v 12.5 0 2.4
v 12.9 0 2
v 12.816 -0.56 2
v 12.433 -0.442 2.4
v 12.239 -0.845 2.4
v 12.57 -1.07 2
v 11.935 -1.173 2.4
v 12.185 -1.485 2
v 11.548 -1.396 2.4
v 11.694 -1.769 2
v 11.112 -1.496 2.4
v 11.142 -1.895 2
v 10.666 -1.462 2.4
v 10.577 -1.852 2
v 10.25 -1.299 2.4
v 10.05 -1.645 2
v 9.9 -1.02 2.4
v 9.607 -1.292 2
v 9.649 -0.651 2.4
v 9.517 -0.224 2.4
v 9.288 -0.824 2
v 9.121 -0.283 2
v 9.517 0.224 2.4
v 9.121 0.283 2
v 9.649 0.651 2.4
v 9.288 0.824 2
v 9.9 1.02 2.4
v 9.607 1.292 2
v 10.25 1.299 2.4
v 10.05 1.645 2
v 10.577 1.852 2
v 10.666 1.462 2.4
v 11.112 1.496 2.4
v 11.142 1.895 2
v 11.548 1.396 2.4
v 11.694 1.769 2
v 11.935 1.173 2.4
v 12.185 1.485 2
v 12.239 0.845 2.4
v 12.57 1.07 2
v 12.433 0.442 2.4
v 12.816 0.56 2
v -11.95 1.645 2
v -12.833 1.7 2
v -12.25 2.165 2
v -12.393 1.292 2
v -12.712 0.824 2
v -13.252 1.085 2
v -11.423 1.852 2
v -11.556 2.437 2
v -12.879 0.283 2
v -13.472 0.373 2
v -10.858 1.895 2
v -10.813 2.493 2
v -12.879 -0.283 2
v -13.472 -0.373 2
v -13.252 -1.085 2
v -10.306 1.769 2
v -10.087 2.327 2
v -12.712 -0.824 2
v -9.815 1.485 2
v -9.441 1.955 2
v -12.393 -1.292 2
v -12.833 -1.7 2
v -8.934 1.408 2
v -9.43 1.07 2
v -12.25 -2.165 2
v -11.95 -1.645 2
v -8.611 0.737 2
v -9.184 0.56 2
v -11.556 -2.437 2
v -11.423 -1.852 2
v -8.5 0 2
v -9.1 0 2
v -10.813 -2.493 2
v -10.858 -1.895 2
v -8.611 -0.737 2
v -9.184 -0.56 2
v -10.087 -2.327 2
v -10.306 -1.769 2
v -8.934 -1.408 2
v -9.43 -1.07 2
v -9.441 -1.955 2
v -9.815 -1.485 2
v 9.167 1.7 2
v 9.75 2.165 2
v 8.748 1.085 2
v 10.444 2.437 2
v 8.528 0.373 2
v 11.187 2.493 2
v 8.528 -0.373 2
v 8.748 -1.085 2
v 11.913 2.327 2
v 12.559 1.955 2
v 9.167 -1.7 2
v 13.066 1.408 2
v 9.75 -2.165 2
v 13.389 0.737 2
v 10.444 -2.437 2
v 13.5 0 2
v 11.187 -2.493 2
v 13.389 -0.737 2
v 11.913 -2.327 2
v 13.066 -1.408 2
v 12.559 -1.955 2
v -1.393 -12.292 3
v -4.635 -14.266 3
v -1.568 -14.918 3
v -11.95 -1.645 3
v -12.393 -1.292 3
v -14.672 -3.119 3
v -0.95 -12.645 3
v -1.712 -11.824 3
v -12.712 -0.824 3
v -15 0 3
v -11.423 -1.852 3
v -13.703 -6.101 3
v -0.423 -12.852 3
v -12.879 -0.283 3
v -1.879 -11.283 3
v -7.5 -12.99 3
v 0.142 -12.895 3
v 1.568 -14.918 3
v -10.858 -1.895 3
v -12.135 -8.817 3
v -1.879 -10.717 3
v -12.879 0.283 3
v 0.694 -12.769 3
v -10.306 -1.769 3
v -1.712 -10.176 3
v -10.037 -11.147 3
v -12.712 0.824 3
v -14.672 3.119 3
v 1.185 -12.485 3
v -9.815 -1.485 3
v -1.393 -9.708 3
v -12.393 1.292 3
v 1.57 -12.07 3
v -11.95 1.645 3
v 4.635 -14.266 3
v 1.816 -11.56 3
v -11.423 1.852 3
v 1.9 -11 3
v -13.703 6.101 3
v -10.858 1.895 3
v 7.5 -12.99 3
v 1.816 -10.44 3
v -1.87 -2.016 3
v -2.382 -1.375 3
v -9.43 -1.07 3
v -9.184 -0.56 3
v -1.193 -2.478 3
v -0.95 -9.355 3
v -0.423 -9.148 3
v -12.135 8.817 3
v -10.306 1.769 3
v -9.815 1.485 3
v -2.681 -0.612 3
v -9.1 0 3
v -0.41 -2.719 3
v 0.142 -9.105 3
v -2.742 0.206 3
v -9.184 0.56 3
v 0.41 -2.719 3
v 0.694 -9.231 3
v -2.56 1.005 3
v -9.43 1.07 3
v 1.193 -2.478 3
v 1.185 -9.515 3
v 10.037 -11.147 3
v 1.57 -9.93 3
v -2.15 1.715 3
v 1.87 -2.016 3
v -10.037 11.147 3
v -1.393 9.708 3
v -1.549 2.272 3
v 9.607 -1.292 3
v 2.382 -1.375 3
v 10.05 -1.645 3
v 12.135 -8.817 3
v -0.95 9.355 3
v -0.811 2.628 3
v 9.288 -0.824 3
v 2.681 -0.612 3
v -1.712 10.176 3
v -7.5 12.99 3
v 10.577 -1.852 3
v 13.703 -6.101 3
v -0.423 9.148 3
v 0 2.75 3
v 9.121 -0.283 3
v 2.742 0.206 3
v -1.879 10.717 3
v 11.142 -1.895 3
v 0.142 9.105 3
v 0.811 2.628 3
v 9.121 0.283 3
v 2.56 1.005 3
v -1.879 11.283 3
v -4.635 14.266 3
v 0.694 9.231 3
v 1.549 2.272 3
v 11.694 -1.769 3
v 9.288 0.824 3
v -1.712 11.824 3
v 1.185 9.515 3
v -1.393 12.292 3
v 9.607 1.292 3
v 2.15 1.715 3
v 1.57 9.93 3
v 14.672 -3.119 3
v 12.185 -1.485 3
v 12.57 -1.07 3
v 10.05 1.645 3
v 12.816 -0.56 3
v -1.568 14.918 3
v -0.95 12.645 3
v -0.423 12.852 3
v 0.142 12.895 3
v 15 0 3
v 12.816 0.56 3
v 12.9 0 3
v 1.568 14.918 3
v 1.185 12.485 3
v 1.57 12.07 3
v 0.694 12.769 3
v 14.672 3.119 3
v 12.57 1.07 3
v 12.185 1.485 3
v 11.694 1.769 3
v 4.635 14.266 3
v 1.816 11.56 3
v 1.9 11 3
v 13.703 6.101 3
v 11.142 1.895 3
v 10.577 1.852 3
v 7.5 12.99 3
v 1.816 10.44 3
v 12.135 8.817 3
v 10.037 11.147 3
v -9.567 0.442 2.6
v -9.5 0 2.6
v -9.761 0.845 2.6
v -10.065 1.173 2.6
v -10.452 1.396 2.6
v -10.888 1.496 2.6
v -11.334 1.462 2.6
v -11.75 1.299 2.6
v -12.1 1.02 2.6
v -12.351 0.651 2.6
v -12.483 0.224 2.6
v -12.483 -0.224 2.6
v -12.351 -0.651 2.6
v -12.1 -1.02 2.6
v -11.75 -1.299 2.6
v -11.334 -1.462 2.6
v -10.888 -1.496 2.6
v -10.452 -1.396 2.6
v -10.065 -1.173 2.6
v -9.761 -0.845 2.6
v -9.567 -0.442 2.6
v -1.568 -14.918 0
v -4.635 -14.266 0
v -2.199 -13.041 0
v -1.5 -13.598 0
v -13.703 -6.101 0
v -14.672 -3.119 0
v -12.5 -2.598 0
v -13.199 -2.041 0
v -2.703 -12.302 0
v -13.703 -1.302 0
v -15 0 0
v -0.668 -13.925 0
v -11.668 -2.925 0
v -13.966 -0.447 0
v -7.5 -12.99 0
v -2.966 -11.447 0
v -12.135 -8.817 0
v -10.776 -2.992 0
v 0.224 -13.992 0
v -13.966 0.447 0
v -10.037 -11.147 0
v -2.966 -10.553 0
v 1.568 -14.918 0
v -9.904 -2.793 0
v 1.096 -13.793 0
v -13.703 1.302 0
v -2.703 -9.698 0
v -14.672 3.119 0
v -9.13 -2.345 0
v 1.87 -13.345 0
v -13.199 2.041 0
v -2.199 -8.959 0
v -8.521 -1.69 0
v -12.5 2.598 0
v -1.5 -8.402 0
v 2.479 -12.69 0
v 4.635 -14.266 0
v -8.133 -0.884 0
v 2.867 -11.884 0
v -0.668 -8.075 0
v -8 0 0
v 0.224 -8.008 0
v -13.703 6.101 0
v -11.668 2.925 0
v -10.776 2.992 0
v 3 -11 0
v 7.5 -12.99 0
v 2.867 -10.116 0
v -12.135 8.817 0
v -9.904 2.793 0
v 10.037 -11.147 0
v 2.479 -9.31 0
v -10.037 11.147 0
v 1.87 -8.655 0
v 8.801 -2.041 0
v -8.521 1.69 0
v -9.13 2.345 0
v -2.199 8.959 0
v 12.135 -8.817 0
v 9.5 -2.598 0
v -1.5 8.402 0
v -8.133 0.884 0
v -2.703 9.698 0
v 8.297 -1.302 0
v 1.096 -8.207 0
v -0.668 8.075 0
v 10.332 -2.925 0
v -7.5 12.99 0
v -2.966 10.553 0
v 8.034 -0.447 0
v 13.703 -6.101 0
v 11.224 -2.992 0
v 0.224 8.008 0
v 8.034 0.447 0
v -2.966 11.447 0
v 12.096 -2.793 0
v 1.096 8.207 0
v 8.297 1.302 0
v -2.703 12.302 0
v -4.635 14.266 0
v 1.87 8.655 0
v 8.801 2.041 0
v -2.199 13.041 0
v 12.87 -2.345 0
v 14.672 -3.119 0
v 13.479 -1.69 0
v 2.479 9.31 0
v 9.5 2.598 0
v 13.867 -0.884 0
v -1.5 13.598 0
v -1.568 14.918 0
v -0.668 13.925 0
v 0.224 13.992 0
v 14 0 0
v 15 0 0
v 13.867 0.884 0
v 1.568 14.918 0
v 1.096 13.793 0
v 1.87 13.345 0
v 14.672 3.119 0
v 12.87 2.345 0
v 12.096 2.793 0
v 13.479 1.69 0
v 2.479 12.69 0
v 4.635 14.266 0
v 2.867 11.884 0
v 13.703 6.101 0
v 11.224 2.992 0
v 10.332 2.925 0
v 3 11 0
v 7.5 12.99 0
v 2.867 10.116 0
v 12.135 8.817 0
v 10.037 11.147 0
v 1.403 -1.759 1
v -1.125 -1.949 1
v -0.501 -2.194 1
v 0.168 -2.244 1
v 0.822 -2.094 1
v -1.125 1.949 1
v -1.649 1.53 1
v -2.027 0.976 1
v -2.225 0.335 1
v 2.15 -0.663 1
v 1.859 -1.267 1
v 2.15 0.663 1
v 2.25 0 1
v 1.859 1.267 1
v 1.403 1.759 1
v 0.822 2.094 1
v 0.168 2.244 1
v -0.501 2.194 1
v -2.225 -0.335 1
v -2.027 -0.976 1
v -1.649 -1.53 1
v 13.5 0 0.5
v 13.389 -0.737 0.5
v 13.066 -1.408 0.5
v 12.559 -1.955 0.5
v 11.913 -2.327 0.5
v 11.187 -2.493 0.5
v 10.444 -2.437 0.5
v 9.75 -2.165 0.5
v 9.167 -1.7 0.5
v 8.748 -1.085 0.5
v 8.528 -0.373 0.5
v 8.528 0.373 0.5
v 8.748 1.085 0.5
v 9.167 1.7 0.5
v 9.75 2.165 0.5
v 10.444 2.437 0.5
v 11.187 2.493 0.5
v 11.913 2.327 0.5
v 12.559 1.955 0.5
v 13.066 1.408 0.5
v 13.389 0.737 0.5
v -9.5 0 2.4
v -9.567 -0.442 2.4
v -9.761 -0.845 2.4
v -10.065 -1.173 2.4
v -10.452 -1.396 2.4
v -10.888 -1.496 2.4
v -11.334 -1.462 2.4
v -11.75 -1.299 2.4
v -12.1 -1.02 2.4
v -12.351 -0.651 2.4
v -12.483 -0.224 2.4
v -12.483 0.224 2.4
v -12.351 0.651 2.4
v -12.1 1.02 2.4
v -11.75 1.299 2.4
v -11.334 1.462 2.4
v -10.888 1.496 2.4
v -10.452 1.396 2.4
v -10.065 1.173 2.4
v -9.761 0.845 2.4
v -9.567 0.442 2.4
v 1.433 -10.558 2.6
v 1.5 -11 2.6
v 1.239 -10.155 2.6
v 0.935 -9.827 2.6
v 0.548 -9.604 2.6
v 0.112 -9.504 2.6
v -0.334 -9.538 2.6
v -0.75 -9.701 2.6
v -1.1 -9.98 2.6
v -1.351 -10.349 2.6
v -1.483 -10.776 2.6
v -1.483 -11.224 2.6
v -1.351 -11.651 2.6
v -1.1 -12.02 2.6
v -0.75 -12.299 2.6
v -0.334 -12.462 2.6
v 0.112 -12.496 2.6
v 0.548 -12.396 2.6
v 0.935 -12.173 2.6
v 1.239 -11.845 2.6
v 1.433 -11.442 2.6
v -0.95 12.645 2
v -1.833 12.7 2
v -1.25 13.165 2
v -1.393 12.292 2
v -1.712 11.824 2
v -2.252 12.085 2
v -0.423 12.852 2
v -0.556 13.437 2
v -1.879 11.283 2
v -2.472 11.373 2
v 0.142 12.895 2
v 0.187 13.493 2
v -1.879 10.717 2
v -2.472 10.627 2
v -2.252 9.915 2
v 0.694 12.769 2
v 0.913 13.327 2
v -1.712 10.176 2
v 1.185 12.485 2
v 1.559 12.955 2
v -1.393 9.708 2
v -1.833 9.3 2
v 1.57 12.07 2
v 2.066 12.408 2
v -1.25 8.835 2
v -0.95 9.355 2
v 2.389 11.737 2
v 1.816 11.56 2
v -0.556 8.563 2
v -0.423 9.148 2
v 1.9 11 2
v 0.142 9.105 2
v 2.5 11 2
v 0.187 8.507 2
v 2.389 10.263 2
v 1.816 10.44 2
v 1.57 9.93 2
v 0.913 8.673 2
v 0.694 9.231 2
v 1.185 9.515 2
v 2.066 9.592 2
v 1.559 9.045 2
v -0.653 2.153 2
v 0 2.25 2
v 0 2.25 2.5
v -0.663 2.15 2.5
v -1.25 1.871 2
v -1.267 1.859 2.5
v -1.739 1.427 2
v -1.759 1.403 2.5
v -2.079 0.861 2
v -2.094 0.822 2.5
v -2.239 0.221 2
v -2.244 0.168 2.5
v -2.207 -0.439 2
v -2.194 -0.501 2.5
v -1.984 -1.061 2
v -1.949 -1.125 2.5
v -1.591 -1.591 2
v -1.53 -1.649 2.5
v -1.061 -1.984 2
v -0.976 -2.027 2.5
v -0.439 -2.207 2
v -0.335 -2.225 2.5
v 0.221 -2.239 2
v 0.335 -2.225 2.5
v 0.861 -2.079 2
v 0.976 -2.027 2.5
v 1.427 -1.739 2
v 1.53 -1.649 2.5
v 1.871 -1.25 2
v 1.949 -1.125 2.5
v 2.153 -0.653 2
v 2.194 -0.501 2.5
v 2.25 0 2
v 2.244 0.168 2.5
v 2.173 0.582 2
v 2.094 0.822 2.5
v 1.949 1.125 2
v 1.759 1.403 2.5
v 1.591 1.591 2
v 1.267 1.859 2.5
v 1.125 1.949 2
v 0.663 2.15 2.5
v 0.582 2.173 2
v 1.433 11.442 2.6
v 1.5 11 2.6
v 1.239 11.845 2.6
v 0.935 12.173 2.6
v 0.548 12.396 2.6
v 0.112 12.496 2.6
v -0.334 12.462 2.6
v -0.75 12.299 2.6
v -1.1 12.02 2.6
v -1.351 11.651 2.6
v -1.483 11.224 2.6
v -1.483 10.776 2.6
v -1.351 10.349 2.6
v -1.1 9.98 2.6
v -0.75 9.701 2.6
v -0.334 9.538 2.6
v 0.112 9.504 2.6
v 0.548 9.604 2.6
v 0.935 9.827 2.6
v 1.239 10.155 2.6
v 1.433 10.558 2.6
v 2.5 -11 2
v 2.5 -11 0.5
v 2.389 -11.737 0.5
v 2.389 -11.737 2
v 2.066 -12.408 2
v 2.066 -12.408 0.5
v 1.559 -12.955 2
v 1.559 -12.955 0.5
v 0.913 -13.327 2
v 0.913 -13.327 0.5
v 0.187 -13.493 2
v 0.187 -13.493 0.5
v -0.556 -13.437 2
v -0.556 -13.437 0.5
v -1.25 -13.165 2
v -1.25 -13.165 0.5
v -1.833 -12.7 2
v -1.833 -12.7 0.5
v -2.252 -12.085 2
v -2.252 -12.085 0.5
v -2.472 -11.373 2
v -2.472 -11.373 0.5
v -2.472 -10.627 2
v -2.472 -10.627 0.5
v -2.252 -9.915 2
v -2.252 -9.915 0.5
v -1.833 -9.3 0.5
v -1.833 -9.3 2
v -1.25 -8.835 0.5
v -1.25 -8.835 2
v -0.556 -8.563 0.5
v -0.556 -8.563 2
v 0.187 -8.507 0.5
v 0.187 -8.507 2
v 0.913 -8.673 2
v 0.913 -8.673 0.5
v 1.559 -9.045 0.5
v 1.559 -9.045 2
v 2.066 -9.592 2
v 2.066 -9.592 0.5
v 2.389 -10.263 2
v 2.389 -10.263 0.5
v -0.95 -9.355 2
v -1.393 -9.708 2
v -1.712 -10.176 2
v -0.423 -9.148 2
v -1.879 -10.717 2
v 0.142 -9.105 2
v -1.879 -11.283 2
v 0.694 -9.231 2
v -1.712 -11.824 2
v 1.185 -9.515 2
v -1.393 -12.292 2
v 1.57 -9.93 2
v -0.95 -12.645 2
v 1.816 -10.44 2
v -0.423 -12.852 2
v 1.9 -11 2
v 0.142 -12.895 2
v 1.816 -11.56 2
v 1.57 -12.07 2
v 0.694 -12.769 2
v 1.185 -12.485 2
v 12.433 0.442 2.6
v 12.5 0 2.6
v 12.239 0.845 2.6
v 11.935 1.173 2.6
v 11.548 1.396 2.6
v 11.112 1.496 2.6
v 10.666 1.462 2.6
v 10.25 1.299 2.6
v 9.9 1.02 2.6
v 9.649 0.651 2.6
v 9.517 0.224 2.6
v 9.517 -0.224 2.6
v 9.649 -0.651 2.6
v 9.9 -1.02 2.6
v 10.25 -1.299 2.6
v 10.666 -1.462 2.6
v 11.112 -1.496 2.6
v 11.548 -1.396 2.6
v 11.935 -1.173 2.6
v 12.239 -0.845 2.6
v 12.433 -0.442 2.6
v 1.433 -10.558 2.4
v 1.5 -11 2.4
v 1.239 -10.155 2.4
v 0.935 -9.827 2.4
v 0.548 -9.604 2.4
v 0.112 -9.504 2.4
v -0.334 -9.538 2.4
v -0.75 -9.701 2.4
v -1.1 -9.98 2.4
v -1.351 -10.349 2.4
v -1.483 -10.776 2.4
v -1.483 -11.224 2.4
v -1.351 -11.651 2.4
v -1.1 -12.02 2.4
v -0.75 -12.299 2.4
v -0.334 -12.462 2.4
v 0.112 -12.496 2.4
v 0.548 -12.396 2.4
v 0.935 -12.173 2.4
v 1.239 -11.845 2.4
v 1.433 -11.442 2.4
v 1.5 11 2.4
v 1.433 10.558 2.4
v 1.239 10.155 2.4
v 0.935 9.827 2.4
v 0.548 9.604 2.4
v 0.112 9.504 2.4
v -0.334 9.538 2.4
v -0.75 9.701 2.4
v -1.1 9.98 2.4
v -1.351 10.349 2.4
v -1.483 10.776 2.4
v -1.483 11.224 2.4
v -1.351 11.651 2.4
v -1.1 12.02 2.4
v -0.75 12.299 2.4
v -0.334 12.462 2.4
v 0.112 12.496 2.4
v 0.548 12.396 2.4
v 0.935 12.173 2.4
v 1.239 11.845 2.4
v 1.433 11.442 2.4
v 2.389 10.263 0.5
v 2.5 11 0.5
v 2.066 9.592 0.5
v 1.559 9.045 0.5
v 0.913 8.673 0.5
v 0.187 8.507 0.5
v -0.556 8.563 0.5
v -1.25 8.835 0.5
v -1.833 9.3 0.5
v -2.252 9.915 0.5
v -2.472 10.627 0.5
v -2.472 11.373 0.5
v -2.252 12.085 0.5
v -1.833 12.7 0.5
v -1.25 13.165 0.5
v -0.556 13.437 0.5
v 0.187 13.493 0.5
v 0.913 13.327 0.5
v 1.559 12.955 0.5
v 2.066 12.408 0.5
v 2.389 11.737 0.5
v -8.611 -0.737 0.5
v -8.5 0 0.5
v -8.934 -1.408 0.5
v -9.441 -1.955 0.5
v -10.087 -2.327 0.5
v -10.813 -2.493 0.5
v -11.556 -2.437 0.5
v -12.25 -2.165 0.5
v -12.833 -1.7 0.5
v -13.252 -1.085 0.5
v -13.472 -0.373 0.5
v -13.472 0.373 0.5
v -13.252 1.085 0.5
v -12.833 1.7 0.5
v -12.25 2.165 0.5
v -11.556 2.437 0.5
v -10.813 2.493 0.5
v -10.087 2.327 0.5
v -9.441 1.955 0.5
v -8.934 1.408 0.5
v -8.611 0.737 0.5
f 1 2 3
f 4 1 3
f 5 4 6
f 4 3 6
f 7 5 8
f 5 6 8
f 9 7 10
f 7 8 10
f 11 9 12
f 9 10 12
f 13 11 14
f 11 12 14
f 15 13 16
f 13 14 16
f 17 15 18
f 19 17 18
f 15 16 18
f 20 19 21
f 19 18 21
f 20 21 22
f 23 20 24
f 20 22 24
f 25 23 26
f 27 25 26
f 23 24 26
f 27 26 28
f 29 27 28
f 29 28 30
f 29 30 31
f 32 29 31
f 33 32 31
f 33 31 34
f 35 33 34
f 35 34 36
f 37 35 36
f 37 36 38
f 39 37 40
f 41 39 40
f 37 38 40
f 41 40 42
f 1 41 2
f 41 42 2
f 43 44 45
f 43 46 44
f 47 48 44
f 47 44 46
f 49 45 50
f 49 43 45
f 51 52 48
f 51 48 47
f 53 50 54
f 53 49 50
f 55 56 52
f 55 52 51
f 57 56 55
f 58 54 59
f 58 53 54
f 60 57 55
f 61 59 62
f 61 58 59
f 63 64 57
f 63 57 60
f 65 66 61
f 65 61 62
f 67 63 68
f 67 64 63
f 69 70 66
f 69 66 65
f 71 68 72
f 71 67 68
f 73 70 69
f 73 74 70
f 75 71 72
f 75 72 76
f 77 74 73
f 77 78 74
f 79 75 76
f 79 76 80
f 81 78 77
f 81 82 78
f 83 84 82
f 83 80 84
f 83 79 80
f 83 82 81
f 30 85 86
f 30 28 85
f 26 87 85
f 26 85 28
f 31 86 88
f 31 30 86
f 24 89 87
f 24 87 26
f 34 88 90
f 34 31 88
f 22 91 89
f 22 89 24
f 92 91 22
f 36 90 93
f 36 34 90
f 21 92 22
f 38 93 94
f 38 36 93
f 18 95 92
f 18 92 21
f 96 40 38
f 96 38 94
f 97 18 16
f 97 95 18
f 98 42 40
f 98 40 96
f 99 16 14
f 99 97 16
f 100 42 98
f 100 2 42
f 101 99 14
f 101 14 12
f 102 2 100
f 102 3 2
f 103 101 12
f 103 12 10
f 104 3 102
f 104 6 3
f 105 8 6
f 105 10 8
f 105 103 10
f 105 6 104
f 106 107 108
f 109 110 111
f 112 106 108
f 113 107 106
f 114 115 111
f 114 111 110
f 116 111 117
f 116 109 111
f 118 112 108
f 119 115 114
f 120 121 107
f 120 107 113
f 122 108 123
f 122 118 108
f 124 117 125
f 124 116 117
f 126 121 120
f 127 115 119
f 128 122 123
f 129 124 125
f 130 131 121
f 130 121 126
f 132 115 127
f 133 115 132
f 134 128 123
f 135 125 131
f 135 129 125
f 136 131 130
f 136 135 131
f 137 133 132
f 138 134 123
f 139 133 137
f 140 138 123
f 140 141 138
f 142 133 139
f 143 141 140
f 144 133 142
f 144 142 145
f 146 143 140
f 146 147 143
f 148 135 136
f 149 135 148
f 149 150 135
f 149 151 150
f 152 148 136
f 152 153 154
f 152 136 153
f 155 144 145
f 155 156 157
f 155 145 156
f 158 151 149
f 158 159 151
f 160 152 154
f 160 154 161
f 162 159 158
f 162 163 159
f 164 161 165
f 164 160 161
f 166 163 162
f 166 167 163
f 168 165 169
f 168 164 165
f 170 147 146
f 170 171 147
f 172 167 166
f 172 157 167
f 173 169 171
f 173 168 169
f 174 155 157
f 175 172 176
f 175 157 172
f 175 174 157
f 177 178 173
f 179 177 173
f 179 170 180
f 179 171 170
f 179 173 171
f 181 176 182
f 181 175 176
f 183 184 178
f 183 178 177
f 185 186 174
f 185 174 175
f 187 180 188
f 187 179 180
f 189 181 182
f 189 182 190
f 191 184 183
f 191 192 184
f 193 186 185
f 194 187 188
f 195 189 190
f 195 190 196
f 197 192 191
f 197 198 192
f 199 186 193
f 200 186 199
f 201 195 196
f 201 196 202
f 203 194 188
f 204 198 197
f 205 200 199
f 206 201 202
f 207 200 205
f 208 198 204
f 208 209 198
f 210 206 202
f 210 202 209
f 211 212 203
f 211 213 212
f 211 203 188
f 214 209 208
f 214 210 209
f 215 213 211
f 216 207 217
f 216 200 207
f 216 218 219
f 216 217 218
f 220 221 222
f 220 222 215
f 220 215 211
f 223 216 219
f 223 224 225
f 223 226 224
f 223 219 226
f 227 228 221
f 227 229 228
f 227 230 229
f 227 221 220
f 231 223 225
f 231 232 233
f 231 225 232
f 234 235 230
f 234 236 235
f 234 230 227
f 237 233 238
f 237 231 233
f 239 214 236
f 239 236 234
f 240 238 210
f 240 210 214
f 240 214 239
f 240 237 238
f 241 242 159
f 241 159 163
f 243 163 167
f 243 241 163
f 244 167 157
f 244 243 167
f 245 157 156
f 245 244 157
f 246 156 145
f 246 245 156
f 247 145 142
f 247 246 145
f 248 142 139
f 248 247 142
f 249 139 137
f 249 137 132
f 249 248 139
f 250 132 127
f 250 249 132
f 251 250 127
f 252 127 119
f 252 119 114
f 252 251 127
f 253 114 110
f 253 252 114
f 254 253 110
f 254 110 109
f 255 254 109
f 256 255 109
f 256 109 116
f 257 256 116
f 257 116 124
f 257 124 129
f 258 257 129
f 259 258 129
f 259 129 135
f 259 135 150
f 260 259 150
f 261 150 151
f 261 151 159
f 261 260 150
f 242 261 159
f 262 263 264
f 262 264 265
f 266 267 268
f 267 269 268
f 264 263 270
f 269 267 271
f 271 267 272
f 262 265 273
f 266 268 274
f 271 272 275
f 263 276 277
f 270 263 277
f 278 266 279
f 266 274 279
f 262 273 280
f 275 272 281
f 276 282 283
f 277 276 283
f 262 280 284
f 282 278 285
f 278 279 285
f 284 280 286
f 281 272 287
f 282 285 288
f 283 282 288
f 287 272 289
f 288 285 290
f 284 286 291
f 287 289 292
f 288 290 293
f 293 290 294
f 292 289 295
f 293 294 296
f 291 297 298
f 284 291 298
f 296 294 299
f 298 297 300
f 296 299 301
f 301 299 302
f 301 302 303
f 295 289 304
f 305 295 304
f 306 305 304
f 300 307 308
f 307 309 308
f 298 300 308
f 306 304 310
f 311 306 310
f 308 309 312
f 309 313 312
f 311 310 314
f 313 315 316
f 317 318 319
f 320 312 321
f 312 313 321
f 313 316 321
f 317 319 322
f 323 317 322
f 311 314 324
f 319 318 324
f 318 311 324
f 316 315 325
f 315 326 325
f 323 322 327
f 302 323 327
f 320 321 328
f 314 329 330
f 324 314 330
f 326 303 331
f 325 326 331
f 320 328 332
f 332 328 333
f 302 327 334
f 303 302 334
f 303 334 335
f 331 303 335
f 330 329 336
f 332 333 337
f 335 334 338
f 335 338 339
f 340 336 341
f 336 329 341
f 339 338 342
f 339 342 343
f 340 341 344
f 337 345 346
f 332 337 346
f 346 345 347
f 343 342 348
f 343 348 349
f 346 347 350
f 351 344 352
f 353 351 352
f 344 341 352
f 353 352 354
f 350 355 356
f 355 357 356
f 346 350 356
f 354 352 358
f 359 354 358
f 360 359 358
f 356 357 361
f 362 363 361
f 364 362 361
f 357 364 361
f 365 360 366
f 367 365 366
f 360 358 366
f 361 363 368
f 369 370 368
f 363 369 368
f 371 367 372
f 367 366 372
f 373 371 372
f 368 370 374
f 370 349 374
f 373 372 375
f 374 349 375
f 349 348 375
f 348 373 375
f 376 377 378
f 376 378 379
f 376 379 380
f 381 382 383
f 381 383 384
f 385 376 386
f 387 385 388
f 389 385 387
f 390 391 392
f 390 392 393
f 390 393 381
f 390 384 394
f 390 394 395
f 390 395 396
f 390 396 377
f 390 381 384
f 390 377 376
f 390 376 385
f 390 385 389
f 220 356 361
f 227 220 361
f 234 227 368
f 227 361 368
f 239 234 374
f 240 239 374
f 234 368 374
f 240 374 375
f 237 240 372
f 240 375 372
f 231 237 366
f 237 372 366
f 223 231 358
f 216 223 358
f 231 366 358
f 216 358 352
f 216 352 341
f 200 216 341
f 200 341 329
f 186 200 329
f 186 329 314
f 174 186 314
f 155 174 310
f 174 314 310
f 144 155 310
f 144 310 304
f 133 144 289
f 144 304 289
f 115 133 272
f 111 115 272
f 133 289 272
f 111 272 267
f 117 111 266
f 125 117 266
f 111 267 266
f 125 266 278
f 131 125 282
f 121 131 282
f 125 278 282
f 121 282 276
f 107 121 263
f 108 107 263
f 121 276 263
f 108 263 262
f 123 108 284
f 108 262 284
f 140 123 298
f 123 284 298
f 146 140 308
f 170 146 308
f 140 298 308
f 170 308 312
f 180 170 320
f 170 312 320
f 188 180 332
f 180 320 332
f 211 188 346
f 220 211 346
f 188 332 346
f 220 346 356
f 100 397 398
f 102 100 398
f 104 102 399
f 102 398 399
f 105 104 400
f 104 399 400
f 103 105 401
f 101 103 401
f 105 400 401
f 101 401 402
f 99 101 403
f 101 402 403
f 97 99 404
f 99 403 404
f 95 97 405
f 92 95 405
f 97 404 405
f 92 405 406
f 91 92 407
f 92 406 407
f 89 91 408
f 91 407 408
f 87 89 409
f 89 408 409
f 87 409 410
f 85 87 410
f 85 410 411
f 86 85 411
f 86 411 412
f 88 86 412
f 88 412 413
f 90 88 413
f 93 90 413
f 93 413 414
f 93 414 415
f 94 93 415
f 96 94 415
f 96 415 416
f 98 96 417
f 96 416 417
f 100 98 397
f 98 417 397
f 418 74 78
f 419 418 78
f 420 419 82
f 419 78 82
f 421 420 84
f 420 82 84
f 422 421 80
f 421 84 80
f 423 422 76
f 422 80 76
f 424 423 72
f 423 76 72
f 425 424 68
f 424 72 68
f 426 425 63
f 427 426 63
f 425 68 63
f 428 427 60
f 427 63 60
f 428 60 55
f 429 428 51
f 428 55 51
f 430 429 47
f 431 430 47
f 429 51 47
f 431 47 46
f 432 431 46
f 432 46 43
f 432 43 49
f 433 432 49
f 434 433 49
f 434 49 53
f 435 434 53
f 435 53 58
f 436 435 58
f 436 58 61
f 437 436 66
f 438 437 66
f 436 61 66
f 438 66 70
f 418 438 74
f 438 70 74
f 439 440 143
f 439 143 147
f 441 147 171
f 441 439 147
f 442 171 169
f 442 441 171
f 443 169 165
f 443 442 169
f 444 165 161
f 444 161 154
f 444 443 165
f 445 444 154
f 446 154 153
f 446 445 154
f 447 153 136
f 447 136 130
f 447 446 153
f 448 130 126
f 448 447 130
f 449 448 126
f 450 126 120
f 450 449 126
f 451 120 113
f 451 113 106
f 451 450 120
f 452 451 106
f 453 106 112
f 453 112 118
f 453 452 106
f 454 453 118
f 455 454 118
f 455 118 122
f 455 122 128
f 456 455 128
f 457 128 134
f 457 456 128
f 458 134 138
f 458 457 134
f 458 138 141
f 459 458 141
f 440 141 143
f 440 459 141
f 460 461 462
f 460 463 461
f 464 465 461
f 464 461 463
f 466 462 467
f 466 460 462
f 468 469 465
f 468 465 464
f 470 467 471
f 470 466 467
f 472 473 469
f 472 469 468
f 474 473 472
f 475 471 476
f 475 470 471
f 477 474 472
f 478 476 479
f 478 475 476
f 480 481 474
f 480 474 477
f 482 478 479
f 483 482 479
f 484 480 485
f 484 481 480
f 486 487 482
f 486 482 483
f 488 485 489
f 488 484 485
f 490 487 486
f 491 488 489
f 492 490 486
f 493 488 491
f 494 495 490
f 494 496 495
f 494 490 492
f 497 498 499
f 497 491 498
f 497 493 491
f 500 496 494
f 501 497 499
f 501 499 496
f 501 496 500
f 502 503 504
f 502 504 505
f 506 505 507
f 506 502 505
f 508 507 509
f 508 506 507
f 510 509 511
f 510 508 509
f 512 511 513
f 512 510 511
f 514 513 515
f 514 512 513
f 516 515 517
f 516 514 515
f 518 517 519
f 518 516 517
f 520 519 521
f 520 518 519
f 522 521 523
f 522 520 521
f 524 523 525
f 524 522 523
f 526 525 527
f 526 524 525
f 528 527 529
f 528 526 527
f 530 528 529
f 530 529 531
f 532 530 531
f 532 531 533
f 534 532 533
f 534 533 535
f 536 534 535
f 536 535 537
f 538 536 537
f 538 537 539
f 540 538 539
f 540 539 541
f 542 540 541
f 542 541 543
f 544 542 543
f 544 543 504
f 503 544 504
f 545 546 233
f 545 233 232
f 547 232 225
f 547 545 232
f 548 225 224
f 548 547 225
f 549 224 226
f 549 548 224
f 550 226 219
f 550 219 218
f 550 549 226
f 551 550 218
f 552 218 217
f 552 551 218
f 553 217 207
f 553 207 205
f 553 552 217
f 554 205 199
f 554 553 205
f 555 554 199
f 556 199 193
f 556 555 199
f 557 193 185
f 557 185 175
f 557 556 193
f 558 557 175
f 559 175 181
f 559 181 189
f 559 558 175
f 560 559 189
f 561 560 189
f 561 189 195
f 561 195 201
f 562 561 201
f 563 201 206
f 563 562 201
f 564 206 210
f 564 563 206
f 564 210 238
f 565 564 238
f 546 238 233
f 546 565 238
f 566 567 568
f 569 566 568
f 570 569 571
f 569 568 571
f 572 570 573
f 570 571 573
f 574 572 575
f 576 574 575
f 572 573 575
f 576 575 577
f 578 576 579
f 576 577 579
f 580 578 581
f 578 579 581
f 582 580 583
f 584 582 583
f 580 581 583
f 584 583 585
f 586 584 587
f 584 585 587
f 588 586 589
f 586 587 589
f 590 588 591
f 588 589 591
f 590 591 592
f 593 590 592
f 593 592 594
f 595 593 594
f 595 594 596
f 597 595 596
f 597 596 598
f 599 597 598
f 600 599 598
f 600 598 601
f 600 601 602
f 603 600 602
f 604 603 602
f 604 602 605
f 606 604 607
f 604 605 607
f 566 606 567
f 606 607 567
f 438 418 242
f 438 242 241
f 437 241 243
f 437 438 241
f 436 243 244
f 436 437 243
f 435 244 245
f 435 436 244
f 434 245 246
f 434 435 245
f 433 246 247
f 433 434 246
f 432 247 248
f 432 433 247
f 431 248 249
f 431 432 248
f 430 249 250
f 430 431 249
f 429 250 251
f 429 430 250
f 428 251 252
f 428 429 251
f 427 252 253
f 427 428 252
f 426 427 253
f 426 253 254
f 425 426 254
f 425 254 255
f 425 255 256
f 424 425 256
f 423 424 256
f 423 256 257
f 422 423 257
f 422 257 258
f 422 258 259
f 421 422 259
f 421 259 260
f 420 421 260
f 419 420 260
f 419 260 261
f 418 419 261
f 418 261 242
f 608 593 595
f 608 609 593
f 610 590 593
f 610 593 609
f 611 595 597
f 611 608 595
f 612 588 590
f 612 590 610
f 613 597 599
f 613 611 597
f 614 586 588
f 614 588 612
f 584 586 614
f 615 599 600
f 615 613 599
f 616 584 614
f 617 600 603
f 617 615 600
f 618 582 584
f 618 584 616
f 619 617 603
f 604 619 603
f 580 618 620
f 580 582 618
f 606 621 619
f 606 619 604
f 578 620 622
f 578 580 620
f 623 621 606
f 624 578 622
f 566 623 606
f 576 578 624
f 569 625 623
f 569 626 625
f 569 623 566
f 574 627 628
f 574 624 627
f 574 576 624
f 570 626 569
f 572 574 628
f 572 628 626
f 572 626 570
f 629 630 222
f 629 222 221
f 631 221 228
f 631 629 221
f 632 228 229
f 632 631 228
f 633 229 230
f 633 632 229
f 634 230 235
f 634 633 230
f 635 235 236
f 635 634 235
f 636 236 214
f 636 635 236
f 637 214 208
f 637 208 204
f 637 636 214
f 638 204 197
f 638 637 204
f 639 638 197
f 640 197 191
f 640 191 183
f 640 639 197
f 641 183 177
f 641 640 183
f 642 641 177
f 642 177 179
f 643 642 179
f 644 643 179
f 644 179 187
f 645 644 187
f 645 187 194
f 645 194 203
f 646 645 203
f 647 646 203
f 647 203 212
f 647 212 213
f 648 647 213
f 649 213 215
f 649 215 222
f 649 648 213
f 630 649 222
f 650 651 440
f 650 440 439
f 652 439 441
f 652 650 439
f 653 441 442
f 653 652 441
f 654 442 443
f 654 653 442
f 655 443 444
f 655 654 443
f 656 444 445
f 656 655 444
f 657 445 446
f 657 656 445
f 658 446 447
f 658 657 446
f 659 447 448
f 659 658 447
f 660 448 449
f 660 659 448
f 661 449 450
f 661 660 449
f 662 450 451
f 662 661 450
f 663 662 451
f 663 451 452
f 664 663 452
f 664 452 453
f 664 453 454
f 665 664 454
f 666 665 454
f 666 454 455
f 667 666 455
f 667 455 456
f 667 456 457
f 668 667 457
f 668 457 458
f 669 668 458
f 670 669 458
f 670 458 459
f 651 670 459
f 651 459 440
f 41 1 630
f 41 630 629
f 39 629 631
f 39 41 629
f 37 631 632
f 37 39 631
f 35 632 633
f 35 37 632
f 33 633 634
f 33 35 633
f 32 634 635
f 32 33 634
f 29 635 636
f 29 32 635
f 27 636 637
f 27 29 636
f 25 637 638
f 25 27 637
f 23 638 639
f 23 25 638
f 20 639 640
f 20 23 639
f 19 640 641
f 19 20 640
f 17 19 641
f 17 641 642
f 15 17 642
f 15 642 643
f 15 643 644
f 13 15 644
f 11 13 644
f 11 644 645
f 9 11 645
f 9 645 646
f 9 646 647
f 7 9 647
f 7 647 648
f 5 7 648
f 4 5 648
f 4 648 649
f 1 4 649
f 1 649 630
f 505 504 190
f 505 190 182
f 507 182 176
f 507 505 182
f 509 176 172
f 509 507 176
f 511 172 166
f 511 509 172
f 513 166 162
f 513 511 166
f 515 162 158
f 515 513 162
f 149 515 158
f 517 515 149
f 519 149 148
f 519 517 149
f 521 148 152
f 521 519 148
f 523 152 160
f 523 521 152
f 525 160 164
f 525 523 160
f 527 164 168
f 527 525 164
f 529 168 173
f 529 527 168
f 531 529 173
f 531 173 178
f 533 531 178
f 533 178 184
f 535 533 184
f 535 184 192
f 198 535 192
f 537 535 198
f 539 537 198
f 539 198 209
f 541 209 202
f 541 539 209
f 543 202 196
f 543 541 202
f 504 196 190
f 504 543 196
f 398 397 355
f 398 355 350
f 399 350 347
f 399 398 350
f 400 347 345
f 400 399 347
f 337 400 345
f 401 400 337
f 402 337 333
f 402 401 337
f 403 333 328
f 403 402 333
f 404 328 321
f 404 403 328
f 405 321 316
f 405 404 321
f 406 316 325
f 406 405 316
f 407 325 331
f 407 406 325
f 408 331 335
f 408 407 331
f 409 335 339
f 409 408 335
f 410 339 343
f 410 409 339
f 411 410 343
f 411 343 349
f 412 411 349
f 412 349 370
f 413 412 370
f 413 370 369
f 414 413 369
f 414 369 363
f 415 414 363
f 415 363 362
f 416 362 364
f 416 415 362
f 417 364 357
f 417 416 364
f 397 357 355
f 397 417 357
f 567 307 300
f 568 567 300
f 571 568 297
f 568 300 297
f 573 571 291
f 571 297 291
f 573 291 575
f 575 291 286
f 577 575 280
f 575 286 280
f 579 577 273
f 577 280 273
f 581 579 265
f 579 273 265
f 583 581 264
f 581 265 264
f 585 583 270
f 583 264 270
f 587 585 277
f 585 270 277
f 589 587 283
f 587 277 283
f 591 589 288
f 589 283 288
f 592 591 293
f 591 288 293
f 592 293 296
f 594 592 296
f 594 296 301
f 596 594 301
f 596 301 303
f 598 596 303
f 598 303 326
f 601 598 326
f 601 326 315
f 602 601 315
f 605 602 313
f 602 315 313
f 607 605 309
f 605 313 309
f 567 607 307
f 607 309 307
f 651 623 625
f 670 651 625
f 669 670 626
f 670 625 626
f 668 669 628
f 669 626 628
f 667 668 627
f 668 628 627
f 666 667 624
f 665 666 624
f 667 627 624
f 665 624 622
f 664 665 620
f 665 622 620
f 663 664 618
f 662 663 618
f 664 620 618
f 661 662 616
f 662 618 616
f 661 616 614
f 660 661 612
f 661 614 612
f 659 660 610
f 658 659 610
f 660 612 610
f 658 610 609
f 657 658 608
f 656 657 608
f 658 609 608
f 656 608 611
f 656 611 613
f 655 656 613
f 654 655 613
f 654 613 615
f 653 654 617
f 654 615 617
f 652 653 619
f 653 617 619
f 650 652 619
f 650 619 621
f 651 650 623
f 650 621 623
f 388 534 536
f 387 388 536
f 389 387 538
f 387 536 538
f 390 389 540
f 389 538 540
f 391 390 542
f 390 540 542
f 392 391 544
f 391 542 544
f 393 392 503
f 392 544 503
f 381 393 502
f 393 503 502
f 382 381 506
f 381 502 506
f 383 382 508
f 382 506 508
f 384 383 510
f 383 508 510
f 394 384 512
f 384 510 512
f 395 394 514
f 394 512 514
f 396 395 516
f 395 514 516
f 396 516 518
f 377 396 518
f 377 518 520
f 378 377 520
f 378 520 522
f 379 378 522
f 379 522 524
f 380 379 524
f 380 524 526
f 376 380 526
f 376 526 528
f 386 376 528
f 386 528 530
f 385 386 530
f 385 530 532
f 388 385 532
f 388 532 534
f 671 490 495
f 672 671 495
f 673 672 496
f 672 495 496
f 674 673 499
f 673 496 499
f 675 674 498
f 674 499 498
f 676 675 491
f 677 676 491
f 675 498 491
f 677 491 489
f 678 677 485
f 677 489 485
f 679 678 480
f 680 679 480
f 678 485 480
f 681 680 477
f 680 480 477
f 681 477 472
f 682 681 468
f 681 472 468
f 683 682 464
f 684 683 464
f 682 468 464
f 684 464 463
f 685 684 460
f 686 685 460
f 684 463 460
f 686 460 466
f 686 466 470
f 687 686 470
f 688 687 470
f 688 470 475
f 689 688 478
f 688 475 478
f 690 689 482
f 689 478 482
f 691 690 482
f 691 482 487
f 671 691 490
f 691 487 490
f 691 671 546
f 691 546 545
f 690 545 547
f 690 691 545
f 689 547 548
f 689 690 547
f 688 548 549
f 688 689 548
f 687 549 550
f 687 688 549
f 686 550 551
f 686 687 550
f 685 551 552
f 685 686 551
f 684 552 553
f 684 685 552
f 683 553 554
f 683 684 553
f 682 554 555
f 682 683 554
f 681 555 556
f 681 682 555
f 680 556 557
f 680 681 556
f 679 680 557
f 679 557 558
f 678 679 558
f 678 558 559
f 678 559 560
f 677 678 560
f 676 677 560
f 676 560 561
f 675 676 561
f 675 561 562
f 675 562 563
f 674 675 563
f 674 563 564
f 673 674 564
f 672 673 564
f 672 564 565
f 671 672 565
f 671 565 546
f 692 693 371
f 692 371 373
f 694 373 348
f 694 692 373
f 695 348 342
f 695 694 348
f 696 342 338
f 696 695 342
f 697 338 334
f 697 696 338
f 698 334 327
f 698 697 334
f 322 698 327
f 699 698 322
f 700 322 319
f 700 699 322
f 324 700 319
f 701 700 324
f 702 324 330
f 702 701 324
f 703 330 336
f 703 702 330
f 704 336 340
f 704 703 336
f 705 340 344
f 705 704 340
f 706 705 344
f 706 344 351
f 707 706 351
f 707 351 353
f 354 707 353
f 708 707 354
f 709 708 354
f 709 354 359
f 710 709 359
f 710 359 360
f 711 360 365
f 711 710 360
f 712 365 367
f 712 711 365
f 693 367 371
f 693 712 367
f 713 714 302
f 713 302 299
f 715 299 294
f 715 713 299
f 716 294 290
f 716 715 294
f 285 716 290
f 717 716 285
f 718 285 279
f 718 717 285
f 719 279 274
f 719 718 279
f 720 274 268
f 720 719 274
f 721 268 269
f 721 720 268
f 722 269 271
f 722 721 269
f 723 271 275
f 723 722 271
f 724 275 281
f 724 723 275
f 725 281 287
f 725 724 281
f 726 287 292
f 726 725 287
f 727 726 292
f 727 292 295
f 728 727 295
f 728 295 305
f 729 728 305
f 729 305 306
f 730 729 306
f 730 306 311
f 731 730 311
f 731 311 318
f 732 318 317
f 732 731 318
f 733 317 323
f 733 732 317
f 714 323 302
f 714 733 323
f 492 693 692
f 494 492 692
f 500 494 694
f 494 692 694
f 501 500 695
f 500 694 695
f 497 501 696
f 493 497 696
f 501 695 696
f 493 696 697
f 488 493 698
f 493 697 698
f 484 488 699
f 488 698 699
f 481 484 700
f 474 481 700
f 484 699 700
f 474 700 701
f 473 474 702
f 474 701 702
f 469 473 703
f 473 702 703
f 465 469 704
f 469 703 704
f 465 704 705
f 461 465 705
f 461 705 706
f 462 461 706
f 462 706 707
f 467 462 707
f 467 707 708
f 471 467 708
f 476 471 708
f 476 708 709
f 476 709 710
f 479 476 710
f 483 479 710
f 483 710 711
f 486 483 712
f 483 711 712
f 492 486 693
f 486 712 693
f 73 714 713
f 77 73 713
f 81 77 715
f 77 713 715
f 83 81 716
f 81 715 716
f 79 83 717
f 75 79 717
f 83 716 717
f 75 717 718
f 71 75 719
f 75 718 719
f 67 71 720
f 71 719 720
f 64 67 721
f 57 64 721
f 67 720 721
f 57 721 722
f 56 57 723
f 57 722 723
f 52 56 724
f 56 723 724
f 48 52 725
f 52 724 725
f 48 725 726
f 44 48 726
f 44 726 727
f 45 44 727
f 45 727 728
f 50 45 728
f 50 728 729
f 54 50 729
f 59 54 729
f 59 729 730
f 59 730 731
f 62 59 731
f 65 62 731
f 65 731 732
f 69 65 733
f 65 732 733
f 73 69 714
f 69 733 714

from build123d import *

# Parameters (mm, degrees)
SKETCH_R             = 15
SKETCH_R_2           = 1.5
PAD_DEPTH            = 3
SKETCH002_R          = 2.25
POCKET_DEPTH         = 2
SKETCH001_R          = 5
POCKET001_DEPTH      = 1
SKETCH003_R          = 2.5
POCKET002_DEPTH      = 2
POCKET002_FACE17_R   = 5
POCKET002_FACE17_R_2 = 2.25
PAD001_DEPTH         = 1
CHAMFER_SIZE         = 0.4
CHAMFER001_SIZE      = 0.5
CHAMFER002_SIZE      = 0.4
CHAMFER003_SIZE      = 0.5


with BuildPart() as part:
    # Sketch → Pad (new body)
    with BuildSketch(Plane.XY):
        Circle(SKETCH_R)
        with Locations((0, 11)):
            Circle(SKETCH_R_2, mode=Mode.SUBTRACT)
        with Locations((-11, 0)):
            Circle(SKETCH_R_2, mode=Mode.SUBTRACT)
        with Locations((0, -11)):
            Circle(SKETCH_R_2, mode=Mode.SUBTRACT)
        with Locations((11, 0)):
            Circle(SKETCH_R_2, mode=Mode.SUBTRACT)
    extrude(amount=PAD_DEPTH)

    # Sketch002 (on Face7 of Pad) → Pocket (cut)
    with BuildSketch(Plane.XY.offset(3)):
        Circle(SKETCH002_R)
    extrude(amount=-POCKET_DEPTH, mode=Mode.SUBTRACT)

    # Sketch001 (on Face7 of Pad) → Pocket001 (cut)
    with BuildSketch(Plane.XY.offset(3)):
        Circle(SKETCH001_R)
    extrude(amount=-POCKET001_DEPTH, mode=Mode.SUBTRACT)

    # Sketch003 (on Face2 of Pocket001) → Pocket002 (cut)
    with BuildSketch(Plane(origin=(0, 0, 0), x_dir=(1, 0, 0), z_dir=(0, 0, -1))):
        with Locations((0, 11)):
            Circle(SKETCH003_R)
        with Locations((11, 0)):
            Circle(SKETCH003_R)
        with Locations((0, -11)):
            Circle(SKETCH003_R)
        with Locations((-11, 0)):
            Circle(SKETCH003_R)
    extrude(amount=-POCKET002_DEPTH, mode=Mode.SUBTRACT)

    # Pocket002 Face17 → Pad001 (add)
    with BuildSketch(Plane(origin=(0, 0, 2), x_dir=(0, 1, 0), z_dir=(0, 0, 1))):
        Circle(POCKET002_FACE17_R)
        Circle(POCKET002_FACE17_R_2, mode=Mode.SUBTRACT)
    extrude(amount=PAD001_DEPTH)

    # Chamfer
    chamfer_edges = [part.edges().sort_by_distance(p)[0] for p in [
        (-1.5, -11, 3),
        (-12.5, 0, 3),
        (-1.5, 11, 3),
        (9.5, 0, 3),
    ]]
    chamfer(chamfer_edges, length=CHAMFER_SIZE)

    # Chamfer001
    chamfer001_edges = [part.edges().sort_by_distance(p)[0] for p in [
        (-2.25, 0, 3),
    ]]
    chamfer(chamfer001_edges, length=CHAMFER001_SIZE)

    # Chamfer002
    chamfer002_edges = [part.edges().sort_by_distance(p)[0] for p in [
        (9.5, 0, 2),
        (-1.5, -11, 2),
        (-12.5, 0, 2),
        (-1.5, 11, 2),
    ]]
    chamfer(chamfer002_edges, length=CHAMFER002_SIZE)

    # Chamfer003
    chamfer003_edges = [part.edges().sort_by_distance(p)[0] for p in [
        (-2.5, -11, 0),
        (8.5, 0, 0),
        (-13.5, 0, 0),
        (-2.5, 11, 0),
    ]]
    chamfer(chamfer003_edges, length=CHAMFER003_SIZE)


solid = part.part
